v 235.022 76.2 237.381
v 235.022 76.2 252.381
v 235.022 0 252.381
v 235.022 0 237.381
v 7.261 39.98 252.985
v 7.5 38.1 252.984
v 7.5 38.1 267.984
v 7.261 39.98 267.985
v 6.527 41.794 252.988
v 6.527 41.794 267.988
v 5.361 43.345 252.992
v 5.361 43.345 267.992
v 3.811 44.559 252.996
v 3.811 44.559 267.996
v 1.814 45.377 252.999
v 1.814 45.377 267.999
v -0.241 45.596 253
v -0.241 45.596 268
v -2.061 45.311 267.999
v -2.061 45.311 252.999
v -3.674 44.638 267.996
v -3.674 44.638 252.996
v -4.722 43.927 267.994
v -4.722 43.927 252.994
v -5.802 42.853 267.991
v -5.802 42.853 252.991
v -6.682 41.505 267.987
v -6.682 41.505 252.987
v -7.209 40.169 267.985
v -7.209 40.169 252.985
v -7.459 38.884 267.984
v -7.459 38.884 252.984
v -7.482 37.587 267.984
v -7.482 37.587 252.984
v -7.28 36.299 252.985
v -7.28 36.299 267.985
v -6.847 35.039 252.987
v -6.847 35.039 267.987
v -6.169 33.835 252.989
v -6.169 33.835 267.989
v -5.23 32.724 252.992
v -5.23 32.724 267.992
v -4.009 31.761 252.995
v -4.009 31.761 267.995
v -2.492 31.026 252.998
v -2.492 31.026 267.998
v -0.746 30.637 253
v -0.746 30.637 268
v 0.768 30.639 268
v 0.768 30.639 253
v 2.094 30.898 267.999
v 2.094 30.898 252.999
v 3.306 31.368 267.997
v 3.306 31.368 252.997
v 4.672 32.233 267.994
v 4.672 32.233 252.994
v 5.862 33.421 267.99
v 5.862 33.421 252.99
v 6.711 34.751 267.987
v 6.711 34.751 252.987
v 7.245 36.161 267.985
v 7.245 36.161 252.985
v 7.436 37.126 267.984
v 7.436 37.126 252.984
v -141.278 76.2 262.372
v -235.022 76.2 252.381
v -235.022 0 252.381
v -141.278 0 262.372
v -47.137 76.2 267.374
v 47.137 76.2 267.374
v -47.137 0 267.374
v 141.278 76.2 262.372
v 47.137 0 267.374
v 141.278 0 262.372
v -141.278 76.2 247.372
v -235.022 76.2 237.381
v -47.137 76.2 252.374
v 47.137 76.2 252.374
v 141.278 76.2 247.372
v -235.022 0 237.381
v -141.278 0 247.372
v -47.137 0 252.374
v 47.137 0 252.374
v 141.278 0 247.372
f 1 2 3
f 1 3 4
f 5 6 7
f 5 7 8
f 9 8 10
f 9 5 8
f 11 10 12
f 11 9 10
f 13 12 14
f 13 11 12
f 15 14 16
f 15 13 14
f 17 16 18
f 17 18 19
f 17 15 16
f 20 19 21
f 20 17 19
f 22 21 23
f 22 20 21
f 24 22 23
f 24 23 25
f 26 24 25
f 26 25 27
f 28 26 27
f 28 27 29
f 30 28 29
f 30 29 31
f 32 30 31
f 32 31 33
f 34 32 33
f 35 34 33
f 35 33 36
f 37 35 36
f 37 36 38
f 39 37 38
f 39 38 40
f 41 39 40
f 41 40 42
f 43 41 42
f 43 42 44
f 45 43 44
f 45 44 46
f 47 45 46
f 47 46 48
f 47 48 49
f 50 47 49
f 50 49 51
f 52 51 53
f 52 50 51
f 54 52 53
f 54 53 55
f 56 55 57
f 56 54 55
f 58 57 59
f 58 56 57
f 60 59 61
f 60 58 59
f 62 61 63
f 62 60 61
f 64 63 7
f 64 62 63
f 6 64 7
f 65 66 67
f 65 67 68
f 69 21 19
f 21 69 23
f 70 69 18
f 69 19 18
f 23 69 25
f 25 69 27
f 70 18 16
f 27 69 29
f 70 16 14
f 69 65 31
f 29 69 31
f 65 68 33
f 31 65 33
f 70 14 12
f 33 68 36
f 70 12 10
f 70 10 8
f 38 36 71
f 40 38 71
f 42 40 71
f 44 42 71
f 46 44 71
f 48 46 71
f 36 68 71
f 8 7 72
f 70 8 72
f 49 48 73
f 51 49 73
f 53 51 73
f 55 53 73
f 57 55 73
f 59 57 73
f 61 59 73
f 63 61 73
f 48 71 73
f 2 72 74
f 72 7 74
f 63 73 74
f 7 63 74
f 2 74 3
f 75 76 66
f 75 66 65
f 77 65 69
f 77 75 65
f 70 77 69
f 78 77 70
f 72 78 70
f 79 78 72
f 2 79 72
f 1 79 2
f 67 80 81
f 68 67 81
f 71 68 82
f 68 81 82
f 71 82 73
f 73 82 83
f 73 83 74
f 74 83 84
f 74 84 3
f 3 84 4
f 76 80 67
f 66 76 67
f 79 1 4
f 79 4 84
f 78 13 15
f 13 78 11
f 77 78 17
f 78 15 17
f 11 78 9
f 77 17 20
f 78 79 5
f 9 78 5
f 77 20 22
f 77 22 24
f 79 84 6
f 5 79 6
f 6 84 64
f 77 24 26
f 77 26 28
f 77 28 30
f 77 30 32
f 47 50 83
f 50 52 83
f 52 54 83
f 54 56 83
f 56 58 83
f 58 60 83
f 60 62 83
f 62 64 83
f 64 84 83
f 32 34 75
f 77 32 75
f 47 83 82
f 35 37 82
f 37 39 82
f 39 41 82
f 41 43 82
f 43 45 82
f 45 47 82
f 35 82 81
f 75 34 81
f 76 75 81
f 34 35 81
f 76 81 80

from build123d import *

# Parameters (mm, degrees)
BOSS_EXTRUDE1_DEPTH = 76.2
SKETCH13_R          = 7.5
CUT_EXTRUDE1_DEPTH  = 269


with BuildPart() as part:
    # Sketch1 → Boss-Extrude1 (new body)
    with BuildSketch(Plane(origin=(0, 0, 0), x_dir=(1, 0, 0), z_dir=(0, 1, 0))):
        with BuildLine():
            ThreePointArc((235.021699517, -237.381311512), (0, -253), (-235.021699517, -237.381311512))
            Line((-235.021699517, -237.381311512), (-235.021699517, -252.381311512))
            ThreePointArc((-235.021699517, -252.381311512), (0, -268), (235.021699517, -252.381311512))
            Line((235.021699517, -252.381311512), (235.021699517, -237.381311512))
        make_face()
    extrude(amount=BOSS_EXTRUDE1_DEPTH)

    # Sketch13 → Cut-Extrude1 (cut, through all)
    with BuildSketch(Plane.XY):
        with Locations((0, 38.1)):
            Circle(SKETCH13_R)
    extrude(amount=CUT_EXTRUDE1_DEPTH, mode=Mode.SUBTRACT)


solid = part.part
